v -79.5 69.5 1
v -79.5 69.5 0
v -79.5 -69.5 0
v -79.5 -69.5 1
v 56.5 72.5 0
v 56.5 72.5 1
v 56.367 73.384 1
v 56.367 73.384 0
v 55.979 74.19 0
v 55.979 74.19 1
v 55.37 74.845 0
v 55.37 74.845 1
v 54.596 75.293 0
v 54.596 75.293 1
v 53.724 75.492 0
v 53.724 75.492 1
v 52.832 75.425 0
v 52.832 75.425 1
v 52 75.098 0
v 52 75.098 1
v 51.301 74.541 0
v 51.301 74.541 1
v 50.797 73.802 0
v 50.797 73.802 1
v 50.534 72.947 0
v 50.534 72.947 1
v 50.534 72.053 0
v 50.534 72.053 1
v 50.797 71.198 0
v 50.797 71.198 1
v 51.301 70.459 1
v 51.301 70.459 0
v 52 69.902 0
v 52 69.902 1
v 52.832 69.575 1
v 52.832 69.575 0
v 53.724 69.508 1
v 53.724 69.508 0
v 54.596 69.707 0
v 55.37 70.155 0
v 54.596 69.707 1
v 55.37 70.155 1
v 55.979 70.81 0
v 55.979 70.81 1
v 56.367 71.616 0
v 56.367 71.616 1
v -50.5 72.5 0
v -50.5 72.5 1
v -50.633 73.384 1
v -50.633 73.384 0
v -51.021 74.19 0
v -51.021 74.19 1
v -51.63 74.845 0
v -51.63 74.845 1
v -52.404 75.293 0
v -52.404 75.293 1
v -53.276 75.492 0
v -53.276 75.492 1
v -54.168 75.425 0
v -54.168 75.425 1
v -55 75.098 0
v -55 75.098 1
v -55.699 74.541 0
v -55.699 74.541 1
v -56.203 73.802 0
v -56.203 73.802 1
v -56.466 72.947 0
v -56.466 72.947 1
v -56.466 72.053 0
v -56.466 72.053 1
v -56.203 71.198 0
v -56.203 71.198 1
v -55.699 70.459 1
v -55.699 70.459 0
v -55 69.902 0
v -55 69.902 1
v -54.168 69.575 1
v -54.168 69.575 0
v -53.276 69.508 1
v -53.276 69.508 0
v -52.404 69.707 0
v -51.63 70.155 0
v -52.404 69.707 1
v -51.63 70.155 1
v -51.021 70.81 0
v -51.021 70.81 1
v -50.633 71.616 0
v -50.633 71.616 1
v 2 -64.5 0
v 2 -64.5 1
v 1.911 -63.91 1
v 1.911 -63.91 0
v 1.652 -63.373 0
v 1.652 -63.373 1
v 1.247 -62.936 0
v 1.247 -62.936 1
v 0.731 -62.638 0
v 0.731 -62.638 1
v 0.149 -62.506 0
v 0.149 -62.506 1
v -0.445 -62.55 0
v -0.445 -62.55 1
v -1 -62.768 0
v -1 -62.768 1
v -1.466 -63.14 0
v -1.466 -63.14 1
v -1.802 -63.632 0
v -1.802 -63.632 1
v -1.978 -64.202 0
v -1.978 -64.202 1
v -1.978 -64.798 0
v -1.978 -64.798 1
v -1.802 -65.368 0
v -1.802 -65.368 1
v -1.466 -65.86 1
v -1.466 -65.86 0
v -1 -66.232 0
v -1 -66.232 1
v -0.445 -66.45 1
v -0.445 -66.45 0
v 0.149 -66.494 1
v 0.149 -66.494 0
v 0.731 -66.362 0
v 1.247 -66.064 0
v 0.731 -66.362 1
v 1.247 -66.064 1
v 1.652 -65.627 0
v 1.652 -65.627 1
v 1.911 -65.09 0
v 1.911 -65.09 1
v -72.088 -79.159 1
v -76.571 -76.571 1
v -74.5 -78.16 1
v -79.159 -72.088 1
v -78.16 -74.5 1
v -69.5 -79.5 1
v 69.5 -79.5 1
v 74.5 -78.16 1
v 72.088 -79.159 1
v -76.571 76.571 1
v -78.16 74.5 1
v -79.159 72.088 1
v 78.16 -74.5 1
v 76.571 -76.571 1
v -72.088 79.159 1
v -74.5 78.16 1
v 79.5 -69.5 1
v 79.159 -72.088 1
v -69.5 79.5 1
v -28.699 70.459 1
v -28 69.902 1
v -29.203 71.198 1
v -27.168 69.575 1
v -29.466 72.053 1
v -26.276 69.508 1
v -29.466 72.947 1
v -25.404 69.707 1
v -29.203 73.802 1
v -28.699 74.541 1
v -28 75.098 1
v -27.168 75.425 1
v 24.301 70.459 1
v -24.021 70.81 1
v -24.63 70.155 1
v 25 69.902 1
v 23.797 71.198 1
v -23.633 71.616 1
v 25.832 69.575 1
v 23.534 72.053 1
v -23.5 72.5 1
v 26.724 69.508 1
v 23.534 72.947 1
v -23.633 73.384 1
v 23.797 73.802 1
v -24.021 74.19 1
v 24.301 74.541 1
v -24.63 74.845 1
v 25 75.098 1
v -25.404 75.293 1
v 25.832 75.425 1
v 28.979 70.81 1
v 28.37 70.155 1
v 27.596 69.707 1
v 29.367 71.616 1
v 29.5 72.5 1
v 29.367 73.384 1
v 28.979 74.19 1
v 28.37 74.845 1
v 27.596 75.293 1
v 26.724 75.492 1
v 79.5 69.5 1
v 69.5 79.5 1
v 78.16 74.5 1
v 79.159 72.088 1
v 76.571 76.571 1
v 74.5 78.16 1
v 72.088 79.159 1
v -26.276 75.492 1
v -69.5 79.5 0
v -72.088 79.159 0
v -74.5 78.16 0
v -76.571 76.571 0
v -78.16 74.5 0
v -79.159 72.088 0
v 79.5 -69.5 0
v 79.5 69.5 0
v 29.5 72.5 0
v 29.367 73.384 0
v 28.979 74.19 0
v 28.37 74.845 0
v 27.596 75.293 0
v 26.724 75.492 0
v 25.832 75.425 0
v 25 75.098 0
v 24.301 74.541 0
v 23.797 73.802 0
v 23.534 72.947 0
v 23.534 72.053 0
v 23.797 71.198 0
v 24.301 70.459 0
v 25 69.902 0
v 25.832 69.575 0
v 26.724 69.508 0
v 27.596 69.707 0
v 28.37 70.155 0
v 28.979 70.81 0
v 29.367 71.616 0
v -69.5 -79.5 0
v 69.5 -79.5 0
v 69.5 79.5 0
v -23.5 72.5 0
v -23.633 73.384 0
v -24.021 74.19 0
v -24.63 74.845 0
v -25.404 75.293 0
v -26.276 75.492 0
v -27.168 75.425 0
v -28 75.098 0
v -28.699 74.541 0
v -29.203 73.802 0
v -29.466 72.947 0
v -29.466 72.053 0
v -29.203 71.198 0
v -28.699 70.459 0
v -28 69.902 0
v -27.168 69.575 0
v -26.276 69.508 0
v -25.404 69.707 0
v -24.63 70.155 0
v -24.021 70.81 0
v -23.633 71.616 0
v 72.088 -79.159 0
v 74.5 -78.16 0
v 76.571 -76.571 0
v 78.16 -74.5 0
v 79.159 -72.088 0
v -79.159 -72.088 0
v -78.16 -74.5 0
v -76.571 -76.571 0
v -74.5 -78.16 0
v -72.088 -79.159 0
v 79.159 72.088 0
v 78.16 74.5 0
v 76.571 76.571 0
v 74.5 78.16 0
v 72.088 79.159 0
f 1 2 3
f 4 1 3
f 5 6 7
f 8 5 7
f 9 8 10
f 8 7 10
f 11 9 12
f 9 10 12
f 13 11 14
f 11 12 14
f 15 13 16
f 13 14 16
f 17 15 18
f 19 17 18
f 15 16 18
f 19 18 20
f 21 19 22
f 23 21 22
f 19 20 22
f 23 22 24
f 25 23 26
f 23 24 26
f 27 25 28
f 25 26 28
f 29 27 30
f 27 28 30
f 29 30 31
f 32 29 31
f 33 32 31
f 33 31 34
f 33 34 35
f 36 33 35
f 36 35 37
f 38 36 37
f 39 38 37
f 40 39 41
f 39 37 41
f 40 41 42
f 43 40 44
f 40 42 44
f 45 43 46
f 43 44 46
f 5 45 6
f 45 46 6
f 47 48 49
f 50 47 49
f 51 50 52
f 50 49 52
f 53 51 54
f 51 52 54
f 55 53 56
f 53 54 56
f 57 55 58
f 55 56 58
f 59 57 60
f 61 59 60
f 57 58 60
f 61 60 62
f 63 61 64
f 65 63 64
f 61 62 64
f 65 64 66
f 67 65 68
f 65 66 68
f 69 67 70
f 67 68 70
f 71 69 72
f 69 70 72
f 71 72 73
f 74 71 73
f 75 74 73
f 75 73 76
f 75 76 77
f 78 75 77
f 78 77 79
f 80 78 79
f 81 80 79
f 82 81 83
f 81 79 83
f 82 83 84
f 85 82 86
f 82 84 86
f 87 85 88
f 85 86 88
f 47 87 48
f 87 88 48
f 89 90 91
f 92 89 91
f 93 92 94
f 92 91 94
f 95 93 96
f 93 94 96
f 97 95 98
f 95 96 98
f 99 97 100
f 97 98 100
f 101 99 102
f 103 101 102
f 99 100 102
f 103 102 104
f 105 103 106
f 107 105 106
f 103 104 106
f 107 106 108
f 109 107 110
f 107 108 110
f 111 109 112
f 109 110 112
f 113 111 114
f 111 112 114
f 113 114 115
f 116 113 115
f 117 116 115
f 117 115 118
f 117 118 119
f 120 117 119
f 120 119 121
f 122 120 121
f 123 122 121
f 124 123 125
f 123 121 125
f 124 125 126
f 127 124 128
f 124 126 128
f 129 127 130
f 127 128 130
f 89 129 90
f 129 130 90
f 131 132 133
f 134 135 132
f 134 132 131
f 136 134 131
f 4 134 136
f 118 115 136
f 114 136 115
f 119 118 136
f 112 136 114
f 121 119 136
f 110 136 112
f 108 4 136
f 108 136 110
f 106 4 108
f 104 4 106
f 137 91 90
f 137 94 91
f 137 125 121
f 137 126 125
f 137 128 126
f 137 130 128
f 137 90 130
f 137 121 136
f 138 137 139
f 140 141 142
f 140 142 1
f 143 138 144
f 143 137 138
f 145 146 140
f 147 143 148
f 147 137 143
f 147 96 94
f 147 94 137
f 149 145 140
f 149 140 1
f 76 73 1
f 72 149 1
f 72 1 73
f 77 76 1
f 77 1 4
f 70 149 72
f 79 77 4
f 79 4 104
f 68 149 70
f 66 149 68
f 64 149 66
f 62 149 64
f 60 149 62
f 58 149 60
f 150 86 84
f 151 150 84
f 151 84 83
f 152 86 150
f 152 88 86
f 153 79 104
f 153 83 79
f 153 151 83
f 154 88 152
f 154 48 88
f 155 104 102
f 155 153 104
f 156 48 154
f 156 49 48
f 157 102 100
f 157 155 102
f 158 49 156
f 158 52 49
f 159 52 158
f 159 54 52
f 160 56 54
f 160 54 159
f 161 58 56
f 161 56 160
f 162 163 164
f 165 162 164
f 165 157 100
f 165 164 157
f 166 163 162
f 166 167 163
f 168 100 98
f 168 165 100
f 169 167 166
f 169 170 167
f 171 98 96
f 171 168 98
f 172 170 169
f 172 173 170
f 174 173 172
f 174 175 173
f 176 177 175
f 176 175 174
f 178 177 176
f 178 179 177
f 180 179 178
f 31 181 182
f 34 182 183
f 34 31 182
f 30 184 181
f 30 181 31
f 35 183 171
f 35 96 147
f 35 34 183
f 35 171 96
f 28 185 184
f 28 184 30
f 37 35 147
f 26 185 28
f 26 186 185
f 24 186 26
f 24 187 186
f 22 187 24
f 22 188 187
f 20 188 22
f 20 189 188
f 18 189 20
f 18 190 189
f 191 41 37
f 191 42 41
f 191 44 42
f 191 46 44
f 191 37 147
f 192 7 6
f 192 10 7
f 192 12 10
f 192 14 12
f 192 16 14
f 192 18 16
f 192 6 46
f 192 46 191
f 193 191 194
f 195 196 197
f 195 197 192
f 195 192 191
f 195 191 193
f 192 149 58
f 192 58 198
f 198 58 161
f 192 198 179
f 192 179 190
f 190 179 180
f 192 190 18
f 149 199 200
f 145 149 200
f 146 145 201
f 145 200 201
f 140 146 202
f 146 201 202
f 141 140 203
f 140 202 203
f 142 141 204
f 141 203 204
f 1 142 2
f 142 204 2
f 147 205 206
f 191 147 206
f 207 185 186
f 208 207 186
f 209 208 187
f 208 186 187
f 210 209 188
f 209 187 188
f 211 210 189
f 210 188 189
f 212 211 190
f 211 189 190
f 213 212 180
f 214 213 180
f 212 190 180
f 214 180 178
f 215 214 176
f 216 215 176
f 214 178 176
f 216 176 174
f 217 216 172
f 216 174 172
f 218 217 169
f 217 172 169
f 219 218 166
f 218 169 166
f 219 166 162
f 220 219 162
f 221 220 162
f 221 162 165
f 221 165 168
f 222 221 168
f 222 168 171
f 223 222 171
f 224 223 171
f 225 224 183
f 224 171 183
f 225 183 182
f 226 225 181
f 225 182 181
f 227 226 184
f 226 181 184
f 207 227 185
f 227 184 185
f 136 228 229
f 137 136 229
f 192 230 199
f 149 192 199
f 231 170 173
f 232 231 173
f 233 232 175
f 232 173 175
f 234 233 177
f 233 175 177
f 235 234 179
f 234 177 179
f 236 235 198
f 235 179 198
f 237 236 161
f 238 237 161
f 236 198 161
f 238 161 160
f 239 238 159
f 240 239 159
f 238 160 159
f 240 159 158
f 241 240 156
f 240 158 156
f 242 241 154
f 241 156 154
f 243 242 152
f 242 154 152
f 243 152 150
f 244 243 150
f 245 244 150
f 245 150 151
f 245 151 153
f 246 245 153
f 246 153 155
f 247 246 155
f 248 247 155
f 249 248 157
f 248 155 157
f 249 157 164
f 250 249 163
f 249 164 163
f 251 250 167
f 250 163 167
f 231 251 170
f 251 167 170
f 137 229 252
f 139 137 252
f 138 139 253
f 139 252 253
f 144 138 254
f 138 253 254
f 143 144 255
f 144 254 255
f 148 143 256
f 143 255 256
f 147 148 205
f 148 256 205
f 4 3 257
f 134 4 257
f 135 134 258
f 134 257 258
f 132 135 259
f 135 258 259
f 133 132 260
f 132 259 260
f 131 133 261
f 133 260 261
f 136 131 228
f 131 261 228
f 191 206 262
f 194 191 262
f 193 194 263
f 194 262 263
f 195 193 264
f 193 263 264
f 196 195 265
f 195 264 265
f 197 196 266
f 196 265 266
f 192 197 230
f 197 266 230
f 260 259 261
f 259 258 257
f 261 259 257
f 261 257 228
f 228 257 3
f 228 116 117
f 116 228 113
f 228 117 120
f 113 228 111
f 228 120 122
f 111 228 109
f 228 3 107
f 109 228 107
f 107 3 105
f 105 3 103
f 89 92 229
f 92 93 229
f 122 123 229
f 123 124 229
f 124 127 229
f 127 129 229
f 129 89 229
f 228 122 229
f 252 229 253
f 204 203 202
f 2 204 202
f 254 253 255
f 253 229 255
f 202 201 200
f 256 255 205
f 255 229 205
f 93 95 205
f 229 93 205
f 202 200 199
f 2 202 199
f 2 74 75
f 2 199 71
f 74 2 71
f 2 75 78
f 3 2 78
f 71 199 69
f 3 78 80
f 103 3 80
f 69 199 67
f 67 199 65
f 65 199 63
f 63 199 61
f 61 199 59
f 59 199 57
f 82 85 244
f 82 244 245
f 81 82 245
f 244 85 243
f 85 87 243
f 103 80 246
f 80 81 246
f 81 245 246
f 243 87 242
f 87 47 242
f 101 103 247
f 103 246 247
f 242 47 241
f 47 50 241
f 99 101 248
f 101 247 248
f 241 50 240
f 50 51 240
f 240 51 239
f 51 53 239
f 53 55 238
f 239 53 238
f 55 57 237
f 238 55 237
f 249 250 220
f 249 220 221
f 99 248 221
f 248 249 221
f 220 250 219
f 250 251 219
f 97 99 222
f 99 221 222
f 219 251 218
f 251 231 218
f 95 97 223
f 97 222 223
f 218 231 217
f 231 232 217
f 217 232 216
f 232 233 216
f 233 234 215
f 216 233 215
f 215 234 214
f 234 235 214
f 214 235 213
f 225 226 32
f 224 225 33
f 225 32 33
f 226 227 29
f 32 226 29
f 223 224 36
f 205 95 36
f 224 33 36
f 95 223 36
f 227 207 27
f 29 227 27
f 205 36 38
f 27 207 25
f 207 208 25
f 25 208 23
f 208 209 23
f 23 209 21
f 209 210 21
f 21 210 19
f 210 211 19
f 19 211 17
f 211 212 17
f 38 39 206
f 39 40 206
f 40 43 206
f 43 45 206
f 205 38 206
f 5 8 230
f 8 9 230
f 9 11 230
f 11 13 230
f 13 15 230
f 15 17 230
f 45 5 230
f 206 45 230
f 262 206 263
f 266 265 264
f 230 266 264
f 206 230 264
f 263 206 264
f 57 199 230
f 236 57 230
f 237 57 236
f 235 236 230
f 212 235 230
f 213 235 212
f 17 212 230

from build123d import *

# Parameters (mm, degrees)
EXTRUDE_1_DEPTH     = 1
SKETCH_2_R          = 3
CUT_EXTRUDE_1_DEPTH = 1
SKETCH_3_R          = 2
CUT_EXTRUDE_2_DEPTH = 1


with BuildPart() as part:
    # 스케치1 → 보스-돌출1 (new body)
    with BuildSketch(Plane.XY):
        with BuildLine():
            Line((-69.5, -79.5), (69.5, -79.5))
            ThreePointArc((69.5, -79.5), (76.571067812, -76.571067812), (79.5, -69.5))
            Line((79.5, -69.5), (79.5, 69.5))
            ThreePointArc((79.5, 69.5), (76.571067812, 76.571067812), (69.5, 79.5))
            Line((69.5, 79.5), (-69.5, 79.5))
            ThreePointArc((-69.5, 79.5), (-76.571067812, 76.571067812), (-79.5, 69.5))
            Line((-79.5, 69.5), (-79.5, -69.5))
            ThreePointArc((-79.5, -69.5), (-76.571067812, -76.571067812), (-69.5, -79.5))
        make_face()
    extrude(amount=EXTRUDE_1_DEPTH)

    # 스케치2 → 컷-돌출1 (cut)
    with BuildSketch(Plane.XY.offset(1)):
        with Locations((-53.5, 72.5)):
            Circle(SKETCH_2_R)
        with Locations((-26.5, 72.5)):
            Circle(SKETCH_2_R)
        with Locations((26.5, 72.5)):
            Circle(SKETCH_2_R)
        with Locations((53.5, 72.5)):
            Circle(SKETCH_2_R)
    extrude(amount=-CUT_EXTRUDE_1_DEPTH, mode=Mode.SUBTRACT)

    # 스케치3 → 컷-돌출2 (cut)
    with BuildSketch(Plane.XY.offset(1)):
        with Locations((0, -64.5)):
            Circle(SKETCH_3_R)
    extrude(amount=-CUT_EXTRUDE_2_DEPTH, mode=Mode.SUBTRACT)


solid = part.part
